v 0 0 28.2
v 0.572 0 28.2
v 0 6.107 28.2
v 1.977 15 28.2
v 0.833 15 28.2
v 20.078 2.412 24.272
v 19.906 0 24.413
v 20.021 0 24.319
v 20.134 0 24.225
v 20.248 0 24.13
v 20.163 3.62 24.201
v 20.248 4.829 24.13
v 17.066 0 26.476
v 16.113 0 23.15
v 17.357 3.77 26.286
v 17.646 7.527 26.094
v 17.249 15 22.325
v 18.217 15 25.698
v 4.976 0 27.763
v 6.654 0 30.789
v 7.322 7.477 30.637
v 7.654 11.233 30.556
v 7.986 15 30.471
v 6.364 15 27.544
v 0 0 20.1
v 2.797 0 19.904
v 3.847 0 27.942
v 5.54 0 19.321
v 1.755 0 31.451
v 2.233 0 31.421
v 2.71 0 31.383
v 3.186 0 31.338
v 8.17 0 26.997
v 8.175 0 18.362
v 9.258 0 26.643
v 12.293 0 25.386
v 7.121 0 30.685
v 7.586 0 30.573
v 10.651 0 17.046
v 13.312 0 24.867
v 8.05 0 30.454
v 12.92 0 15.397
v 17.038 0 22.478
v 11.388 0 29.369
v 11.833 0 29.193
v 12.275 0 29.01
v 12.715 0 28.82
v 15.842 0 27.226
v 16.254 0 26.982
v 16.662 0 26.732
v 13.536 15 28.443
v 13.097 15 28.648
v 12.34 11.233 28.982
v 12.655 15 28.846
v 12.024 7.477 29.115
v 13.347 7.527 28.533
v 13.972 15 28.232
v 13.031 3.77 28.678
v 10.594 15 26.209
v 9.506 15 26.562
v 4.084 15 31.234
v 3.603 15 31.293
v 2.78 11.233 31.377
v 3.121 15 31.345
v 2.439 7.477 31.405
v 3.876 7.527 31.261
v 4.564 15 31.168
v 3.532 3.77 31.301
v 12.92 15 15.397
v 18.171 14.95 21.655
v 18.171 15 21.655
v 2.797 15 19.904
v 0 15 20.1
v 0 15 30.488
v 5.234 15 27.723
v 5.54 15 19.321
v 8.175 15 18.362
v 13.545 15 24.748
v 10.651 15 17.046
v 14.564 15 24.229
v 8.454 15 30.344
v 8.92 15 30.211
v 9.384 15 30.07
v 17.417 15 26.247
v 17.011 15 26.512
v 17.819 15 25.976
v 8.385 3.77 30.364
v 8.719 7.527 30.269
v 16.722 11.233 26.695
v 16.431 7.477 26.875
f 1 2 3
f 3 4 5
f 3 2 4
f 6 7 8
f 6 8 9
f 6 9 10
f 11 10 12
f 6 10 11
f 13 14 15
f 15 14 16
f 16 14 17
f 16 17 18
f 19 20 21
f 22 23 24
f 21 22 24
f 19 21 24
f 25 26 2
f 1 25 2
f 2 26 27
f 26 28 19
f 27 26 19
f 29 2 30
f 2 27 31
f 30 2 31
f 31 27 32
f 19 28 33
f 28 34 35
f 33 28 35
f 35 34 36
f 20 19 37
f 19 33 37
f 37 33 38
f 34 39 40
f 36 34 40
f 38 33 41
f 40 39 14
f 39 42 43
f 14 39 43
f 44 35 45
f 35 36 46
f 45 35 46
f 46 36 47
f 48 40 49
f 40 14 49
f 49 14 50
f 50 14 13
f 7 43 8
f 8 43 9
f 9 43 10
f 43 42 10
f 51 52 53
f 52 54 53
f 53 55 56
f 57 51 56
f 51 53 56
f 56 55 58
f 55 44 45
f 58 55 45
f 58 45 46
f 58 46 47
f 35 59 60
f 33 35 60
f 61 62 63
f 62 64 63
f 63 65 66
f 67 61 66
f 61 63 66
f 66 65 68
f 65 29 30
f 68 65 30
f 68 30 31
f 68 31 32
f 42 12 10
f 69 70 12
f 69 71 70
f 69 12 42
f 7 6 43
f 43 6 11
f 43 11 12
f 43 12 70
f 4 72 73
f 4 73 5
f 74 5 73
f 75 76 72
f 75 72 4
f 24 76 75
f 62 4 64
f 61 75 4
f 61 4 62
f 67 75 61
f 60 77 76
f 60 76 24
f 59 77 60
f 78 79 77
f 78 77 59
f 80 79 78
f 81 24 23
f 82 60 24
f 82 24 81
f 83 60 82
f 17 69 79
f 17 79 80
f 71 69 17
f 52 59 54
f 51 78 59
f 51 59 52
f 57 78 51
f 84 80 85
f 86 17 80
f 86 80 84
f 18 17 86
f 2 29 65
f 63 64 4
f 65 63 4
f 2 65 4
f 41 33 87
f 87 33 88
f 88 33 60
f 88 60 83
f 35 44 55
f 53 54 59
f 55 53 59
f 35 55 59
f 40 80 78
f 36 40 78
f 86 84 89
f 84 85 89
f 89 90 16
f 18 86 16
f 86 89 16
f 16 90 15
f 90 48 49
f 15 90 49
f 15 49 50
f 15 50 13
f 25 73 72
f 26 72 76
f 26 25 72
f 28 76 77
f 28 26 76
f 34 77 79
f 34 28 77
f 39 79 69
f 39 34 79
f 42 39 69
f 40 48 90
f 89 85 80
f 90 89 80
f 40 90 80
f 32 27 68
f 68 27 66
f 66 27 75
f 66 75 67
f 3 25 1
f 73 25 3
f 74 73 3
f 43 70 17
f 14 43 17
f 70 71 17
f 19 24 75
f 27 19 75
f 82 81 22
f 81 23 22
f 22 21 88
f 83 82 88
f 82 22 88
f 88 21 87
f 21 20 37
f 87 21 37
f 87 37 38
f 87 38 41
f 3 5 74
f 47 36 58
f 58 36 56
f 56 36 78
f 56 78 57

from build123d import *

# Parameters (mm, degrees)
SKETCH_1_R               = 31.5
SKETCH_1_R_2             = 20.1
EXTRUDE_1_DEPTH          = 15
PATTERN_CIRCULAR_4_COUNT = 40
SKETCH_9_OUTSIDE_W       = 83.064
SKETCH_9_OUTSIDE_H       = 83.064
CUT_EXTRUDE_1_DEPTH      = 48.00244519


with BuildPart() as part:
    # Эскиз1 → Бобышка-Вытянуть1 (new body)
    with BuildSketch(Plane(origin=(0, 0, 0), x_dir=(1, 0, 0), z_dir=(0, 1, 0))):
        with Locations(Location((0, 0, 0), (0, 0, 270))):
            Circle(SKETCH_1_R)
        with Locations(Location((0, 0, 0), (0, 0, 270))):
            Circle(SKETCH_1_R_2, mode=Mode.SUBTRACT)
    extrude(amount=EXTRUDE_1_DEPTH)

    # Вырез-По траектории4: sweep along a path in Эскиз8
    with BuildLine(Plane(origin=(30, 0, 0), x_dir=(0, 0, -1), z_dir=(1, 0, 0))) as sweep_4_path:
        Line((0, 0), (1.610154635, 17.19379209))
    # Эскиз7 → Вырез-По траектории4 (sweep, cut)
    with BuildSketch(Plane(origin=(0, 0, 0), x_dir=(1, 0, 0), z_dir=(0, 1, 0))):
        Polygon((28.2, -0.57191311), (28.2, 0.57191311), (32, 1.955), (32, -1.955), align=None)
    sweep_4 = sweep(path=sweep_4_path.line, mode=Mode.SUBTRACT)

    # Круговой массив4: Вырез-По траектории4 ×40 about axis
    pattern_circular_4_axis = Axis((0, 0, 0), (0, 1, 0))
    for i in range(1, PATTERN_CIRCULAR_4_COUNT):
        add(sweep_4.rotate(pattern_circular_4_axis, i * 360 / PATTERN_CIRCULAR_4_COUNT), mode=Mode.SUBTRACT)

    # Эскиз9 outside → Вырез-Вытянуть1 (cut, through all)
    with BuildSketch(Plane(origin=(0, 15, 0), x_dir=(1, 0, 0), z_dir=(0, 1, 0))):
        Rectangle(SKETCH_9_OUTSIDE_W, SKETCH_9_OUTSIDE_H)
        with BuildLine():
            Line((0, 0), (0, -31.5))
            ThreePointArc((0, -31.5), (10.773634515, -29.600317555), (20.247809705, -24.130399958))
            Line((20.247809705, -24.130399958), (0, 0))
        make_face(mode=Mode.SUBTRACT)
    extrude(amount=-CUT_EXTRUDE_1_DEPTH, mode=Mode.SUBTRACT)


solid = part.part
